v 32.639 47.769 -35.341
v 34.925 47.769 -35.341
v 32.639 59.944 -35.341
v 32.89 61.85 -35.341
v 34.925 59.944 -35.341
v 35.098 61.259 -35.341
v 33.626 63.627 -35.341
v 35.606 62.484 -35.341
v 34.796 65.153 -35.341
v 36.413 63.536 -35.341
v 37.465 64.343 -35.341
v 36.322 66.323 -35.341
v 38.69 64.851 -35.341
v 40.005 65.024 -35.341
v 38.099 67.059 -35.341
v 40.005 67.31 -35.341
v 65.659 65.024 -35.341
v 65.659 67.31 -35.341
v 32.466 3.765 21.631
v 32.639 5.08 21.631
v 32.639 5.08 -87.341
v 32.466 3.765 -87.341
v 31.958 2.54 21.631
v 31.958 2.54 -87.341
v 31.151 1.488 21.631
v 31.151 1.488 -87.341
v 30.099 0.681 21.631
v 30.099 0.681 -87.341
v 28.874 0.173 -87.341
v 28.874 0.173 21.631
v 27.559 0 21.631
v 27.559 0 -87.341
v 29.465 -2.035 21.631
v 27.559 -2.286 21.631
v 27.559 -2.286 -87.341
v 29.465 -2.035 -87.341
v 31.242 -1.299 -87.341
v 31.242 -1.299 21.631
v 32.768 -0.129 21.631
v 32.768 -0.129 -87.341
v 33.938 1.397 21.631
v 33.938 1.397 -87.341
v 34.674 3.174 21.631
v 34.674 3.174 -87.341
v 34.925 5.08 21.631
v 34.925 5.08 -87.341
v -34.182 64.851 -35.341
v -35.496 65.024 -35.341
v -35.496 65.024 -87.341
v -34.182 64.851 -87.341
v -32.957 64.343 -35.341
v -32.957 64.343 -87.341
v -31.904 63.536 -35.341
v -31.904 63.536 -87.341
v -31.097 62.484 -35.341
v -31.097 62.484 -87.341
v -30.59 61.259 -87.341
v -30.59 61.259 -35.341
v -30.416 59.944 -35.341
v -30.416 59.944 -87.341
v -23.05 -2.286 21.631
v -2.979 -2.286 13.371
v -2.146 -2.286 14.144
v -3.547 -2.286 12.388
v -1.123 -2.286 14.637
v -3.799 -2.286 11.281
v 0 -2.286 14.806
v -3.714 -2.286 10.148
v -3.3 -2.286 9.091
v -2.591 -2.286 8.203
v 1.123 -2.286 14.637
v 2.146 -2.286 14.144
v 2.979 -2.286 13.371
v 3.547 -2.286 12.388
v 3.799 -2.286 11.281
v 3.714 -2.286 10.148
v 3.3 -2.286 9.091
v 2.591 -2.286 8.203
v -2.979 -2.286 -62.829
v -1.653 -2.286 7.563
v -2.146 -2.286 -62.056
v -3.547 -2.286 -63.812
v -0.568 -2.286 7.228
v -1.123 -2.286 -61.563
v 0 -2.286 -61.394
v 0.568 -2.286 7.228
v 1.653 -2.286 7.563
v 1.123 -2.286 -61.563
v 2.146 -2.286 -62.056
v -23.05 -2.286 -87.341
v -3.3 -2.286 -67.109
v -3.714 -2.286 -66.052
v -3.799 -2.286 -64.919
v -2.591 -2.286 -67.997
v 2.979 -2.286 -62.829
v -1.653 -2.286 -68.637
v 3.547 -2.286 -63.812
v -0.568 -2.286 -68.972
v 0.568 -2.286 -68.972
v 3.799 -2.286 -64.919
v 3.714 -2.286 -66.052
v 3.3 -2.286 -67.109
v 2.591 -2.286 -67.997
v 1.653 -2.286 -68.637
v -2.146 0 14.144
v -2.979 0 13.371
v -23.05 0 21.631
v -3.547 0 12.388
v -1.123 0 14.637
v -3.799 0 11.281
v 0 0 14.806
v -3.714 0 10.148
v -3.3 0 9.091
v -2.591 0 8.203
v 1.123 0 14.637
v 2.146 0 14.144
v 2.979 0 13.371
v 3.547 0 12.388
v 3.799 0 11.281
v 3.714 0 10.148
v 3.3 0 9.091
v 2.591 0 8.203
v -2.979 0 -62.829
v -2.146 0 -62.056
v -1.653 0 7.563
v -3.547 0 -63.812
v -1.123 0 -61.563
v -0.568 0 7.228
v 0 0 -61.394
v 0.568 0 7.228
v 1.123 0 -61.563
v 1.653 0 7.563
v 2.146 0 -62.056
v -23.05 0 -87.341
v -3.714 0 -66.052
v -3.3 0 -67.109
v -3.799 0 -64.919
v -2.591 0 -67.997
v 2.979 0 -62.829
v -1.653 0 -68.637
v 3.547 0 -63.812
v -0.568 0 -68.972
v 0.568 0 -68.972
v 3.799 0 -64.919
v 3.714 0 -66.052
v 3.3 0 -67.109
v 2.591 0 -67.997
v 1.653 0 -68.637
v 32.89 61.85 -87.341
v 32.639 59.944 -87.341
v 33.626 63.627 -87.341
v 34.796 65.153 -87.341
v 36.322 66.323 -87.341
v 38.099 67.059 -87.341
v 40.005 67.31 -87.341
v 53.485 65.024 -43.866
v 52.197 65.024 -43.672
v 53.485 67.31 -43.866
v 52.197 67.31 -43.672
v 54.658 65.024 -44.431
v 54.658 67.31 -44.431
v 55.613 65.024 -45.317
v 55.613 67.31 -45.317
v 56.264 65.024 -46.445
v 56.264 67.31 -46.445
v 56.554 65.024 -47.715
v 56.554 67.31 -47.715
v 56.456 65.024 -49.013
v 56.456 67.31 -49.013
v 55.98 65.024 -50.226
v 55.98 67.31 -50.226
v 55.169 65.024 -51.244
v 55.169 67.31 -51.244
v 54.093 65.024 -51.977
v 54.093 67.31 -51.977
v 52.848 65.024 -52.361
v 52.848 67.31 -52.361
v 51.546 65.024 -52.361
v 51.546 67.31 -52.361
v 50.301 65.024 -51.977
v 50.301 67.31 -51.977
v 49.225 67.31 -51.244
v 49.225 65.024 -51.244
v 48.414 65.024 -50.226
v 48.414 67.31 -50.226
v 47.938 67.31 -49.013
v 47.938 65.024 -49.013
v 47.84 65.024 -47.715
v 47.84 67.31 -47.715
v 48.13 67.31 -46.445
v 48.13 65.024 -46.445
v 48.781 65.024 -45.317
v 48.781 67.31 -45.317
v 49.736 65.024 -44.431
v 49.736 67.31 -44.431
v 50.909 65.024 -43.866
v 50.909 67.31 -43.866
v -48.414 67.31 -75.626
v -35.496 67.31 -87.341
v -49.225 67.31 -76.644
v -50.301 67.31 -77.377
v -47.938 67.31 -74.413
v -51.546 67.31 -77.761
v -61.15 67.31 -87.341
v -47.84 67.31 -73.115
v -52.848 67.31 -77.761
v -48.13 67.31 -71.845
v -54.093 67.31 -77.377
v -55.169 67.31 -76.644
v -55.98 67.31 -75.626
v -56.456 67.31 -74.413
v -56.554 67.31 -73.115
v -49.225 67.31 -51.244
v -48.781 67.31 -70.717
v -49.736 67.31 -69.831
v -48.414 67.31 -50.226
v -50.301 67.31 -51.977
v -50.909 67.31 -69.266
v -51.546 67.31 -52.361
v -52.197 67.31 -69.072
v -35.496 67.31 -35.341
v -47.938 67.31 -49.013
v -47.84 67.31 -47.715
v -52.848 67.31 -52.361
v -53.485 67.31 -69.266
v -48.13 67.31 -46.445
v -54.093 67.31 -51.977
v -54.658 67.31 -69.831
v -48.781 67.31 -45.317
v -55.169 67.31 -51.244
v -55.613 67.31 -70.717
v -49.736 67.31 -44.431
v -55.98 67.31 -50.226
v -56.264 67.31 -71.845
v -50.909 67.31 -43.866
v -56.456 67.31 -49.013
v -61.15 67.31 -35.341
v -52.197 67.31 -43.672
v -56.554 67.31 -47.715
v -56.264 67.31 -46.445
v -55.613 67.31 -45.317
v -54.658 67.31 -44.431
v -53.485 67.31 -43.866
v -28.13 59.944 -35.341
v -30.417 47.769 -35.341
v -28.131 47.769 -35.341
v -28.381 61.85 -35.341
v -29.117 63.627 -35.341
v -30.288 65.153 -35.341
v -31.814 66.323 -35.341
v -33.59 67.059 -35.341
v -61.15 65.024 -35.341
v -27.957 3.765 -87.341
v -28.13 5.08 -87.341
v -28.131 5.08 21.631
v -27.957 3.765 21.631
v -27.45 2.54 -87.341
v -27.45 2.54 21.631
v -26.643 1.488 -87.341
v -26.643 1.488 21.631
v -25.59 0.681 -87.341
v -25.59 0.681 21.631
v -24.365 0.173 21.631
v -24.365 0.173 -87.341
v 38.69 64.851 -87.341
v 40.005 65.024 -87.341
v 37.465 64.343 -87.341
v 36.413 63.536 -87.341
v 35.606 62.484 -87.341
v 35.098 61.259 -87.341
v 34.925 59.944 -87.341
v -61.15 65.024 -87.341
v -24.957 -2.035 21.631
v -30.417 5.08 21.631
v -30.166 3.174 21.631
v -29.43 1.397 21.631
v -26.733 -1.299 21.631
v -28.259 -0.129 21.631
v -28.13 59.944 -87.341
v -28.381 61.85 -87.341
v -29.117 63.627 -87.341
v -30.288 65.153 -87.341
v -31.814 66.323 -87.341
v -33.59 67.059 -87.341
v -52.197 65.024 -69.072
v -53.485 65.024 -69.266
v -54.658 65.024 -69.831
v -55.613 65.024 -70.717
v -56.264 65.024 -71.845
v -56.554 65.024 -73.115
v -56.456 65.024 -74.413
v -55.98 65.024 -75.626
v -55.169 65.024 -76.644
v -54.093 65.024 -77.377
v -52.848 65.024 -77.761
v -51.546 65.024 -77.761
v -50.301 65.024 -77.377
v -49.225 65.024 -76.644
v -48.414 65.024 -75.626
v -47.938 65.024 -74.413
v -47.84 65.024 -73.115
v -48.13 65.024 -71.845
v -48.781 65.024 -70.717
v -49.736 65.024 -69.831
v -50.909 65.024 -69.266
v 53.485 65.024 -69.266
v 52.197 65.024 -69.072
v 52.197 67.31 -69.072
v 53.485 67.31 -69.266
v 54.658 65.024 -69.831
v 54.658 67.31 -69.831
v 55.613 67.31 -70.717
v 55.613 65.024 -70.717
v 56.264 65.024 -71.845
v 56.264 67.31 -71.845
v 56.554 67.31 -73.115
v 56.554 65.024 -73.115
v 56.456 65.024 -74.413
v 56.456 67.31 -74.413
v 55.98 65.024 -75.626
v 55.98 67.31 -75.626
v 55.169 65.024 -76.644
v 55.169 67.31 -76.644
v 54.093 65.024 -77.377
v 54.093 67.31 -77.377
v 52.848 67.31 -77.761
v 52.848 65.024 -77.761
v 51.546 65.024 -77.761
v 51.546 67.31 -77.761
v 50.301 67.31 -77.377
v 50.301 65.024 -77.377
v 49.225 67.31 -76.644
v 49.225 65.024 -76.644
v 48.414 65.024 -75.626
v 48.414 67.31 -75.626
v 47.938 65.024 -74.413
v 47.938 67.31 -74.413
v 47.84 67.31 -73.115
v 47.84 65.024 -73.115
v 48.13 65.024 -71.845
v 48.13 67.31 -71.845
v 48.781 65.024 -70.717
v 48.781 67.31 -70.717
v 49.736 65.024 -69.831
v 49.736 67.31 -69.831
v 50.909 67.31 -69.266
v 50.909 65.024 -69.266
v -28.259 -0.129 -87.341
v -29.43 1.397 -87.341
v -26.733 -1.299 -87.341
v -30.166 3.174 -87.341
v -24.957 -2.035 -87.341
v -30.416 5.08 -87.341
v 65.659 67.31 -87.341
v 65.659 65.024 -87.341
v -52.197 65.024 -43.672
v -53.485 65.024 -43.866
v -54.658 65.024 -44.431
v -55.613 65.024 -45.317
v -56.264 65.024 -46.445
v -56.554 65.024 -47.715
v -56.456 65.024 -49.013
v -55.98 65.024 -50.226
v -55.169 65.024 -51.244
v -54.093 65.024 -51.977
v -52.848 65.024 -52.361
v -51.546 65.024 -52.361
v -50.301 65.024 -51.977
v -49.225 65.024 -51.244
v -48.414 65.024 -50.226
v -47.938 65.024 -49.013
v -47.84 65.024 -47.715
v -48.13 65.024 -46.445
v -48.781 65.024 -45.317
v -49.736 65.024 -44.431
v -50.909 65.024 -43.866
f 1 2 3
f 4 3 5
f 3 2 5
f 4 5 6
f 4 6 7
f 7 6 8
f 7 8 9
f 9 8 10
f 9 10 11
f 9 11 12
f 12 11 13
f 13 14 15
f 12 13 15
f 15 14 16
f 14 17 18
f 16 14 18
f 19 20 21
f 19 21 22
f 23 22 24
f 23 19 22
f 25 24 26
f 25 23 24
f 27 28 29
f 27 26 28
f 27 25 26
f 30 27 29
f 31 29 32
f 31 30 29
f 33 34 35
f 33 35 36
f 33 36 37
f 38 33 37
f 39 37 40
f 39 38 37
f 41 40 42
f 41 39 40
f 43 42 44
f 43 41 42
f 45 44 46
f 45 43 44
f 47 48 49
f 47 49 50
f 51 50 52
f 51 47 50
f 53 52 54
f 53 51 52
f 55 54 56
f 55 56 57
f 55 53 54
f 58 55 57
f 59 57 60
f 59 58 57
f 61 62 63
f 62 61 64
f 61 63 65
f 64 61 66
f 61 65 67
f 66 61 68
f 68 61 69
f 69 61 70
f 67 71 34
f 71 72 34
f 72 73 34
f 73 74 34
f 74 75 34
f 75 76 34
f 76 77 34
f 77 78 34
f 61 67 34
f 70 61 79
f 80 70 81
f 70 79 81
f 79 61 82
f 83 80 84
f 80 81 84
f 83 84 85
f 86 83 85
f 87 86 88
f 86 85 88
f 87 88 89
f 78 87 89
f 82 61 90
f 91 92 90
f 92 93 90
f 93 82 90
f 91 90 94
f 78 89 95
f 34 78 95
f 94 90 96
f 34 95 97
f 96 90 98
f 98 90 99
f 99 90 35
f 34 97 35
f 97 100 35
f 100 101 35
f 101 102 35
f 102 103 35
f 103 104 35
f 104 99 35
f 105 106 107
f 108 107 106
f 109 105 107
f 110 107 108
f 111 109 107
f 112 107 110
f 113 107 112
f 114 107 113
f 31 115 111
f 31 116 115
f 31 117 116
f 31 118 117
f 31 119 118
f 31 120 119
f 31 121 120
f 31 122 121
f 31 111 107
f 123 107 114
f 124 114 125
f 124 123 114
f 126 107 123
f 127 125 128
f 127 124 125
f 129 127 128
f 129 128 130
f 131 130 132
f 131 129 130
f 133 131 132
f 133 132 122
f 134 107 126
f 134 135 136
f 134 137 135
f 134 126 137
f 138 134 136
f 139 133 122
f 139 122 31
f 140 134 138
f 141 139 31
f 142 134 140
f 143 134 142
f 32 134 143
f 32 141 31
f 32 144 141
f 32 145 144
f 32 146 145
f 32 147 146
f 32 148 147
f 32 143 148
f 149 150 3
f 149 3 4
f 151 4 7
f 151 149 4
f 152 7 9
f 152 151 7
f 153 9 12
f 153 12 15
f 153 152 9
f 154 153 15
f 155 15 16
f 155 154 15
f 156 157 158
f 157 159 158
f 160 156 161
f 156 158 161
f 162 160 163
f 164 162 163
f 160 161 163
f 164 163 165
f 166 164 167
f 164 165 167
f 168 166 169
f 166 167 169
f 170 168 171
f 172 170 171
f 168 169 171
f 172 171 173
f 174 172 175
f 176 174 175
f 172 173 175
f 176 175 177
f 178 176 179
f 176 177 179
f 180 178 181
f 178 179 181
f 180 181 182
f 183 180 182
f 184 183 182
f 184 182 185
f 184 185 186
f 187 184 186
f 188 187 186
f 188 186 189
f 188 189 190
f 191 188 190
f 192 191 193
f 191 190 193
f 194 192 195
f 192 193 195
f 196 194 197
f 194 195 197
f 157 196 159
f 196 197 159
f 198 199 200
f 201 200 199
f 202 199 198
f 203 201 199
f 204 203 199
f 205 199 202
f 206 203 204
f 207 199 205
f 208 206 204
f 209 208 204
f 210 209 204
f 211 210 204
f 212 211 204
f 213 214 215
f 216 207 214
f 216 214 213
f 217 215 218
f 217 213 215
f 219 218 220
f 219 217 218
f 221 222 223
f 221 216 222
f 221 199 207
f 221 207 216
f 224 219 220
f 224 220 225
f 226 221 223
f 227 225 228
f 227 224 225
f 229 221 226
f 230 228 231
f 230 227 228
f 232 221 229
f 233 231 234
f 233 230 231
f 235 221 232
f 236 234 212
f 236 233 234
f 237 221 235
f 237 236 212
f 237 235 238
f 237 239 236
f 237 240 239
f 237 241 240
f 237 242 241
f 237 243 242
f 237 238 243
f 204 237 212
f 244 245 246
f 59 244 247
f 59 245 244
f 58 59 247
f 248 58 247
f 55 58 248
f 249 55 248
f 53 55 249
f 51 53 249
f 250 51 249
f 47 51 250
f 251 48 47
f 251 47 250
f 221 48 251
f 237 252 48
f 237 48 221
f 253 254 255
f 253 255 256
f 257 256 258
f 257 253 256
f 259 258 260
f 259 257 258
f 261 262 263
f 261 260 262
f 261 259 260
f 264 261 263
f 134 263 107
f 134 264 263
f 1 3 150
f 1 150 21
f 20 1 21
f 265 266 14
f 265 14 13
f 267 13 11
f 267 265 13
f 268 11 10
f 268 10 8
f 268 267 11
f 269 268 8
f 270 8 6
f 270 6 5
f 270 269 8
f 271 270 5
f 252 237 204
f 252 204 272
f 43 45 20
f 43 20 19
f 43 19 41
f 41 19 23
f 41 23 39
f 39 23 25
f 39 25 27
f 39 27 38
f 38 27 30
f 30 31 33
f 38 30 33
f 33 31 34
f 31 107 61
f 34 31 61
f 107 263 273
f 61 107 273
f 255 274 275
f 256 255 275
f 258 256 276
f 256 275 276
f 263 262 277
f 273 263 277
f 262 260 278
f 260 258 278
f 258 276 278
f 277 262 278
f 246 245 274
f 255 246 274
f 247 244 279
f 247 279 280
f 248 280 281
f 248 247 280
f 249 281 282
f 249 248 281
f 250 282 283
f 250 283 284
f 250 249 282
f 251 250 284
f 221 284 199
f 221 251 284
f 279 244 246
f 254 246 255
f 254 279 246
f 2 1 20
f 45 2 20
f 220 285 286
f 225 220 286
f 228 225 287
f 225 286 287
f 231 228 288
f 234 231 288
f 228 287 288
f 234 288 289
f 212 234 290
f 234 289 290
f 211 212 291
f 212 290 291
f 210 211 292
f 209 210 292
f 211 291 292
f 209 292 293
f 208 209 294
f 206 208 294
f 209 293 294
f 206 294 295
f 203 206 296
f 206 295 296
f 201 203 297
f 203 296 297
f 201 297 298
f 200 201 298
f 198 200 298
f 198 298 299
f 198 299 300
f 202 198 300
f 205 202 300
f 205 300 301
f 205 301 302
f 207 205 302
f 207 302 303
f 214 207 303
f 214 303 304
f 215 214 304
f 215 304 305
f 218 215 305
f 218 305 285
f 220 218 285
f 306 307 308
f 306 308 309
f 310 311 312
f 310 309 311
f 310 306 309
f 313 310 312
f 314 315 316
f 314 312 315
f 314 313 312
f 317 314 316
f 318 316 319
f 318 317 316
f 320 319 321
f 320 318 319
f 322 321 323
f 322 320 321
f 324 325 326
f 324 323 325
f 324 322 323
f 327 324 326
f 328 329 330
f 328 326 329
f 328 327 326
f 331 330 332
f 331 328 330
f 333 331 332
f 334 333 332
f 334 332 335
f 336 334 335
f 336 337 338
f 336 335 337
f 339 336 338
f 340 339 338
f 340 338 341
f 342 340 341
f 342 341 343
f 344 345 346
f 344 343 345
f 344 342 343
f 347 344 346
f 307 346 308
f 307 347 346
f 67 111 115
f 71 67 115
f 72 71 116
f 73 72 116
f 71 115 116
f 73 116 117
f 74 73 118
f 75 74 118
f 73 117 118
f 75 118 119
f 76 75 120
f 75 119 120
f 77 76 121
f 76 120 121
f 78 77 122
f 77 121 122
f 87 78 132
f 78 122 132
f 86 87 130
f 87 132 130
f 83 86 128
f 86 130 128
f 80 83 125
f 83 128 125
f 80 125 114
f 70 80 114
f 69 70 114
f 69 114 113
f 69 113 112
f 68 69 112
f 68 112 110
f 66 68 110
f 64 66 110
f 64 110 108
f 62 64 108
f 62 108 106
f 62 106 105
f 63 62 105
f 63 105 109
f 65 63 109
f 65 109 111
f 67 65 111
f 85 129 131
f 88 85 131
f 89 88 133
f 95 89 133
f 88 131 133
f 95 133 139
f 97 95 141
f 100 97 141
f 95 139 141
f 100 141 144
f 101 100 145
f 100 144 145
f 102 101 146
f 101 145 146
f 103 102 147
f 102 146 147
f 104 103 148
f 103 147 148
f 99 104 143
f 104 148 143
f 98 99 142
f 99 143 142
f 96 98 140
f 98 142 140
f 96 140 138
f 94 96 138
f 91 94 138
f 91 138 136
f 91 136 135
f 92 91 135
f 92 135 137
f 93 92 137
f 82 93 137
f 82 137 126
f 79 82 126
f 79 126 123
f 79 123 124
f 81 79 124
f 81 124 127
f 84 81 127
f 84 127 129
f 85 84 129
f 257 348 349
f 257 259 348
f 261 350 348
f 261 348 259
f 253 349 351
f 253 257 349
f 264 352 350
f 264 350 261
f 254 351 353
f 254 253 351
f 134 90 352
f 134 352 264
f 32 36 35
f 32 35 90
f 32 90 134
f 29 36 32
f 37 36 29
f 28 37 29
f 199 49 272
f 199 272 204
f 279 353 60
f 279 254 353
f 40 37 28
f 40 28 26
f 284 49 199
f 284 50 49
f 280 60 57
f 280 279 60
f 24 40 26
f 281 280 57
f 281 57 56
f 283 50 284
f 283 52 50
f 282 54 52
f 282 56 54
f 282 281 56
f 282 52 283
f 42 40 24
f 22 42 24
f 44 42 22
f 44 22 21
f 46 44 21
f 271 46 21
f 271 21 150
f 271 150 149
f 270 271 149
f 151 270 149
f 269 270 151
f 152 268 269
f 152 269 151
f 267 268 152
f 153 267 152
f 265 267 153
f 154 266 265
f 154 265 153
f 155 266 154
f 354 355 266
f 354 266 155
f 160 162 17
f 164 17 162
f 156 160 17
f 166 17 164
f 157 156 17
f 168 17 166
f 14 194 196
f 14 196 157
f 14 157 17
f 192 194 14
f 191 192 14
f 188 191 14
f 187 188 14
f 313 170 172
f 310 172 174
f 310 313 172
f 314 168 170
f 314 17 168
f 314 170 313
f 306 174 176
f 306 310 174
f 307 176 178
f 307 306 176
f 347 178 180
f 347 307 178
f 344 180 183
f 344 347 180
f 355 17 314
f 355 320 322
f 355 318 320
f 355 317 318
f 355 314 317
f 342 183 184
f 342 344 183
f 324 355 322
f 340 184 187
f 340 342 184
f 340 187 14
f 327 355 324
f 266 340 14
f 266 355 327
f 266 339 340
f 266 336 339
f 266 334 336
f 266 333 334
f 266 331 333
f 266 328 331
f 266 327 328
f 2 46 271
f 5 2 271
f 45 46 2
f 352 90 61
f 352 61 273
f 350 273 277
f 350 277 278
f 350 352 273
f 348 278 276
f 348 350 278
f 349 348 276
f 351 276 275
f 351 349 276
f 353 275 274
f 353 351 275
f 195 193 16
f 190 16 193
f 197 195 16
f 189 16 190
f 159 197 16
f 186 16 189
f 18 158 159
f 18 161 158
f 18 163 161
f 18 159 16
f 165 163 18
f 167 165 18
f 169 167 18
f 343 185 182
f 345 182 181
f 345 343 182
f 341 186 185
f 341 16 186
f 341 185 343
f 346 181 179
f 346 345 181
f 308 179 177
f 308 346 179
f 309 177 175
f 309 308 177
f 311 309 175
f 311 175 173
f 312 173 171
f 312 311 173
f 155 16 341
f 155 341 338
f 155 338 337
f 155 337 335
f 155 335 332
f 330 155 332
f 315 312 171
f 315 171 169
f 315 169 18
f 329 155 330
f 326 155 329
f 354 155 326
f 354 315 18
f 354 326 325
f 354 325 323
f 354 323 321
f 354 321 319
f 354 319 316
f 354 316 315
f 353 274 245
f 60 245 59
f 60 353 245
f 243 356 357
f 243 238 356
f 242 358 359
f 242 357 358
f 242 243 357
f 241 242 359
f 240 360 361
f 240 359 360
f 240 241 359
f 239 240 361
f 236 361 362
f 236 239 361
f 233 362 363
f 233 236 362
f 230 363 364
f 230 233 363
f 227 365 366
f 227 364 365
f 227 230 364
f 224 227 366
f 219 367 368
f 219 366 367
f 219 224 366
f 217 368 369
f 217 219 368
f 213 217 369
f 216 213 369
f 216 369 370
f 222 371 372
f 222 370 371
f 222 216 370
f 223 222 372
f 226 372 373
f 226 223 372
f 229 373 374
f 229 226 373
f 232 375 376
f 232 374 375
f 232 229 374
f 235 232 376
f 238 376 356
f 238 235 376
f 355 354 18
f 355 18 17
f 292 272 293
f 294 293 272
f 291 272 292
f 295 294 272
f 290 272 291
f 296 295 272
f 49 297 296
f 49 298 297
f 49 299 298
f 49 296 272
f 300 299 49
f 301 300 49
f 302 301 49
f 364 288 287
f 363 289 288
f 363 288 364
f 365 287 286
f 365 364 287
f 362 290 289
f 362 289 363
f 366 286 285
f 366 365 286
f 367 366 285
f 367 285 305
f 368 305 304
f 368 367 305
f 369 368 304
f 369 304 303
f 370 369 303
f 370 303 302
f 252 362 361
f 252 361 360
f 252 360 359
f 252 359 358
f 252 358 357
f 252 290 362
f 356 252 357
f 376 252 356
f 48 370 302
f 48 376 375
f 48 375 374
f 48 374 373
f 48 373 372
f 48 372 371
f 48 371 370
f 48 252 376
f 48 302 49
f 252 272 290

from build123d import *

# Parameters (mm, degrees)
SKETCH2_W                      = 65.3415
SKETCH2_H                      = 177.8
BASE_FLANGE1_DEPTH             = 2.286
EDGE_FLANGE1_STRIP_W           = 19.304
EDGE_FLANGE1_STRIP_H           = 2.286
EDGE_FLANGE1_STRIP_CUT_DEPTH   = 177.8
EDGE_FLANGE1_STRIP_2_W         = 19.304
EDGE_FLANGE1_STRIP_2_H         = 2.286
EDGE_FLANGE1_STRIP_CUT_2_DEPTH = 177.8
EDGE_FLANGE1_DEPTH             = 177.8
EDGE_FLANGE1_BEND_DEPTH        = 177.8
CUT_EXTRUDE1_DEPTH             = 171.223828311
CUT_EXTRUDE1_DEPTH_BACK        = 171.223828311
CUT_EXTRUDE2_DEPTH             = 171.223828311
CUT_EXTRUDE2_DEPTH_BACK        = 171.223828311
SKETCH20_W                     = 141.560534952
SKETCH20_H                     = 182.926434851
EDGE_FLANGE3_STRIP_W           = 19.304
EDGE_FLANGE3_STRIP_H           = 2.286
EDGE_FLANGE3_STRIP_CUT_DEPTH   = 52
EDGE_FLANGE3_STRIP_2_W         = 19.304
EDGE_FLANGE3_STRIP_2_H         = 2.286
EDGE_FLANGE3_STRIP_CUT_2_DEPTH = 52
EDGE_FLANGE3_DEPTH             = 52
EDGE_FLANGE3_BEND_DEPTH        = 52
SKETCH30_R                     = 3.81
CUT_EXTRUDE3_DEPTH             = 129.336350021
SKETCH31_R                     = 4.3688
CUT_EXTRUDE4_DEPTH             = 129.336350021


# Sheet-metal steps are written as plain solids
with BuildPart() as part:
    # Sketch2 → Base-Flange1 (new body)
    with BuildSketch(Plane(origin=(0, 0, 0), x_dir=(1, 0, 0), z_dir=(0, 1, 0))):
        with Locations((2.25425, 63.5)):
            Rectangle(SKETCH2_W, SKETCH2_H)
    extrude(amount=-BASE_FLANGE1_DEPTH)

    # Edge-Flange1 strip (across the edge) → Edge-Flange1 strip cut (cut)
    with BuildSketch(Plane(origin=(-30.4165, 0, -152.4), x_dir=(1, 0, 0), z_dir=(0, 0, 1))):
        with Locations((-2.286, -1.143)):
            Rectangle(EDGE_FLANGE1_STRIP_W, EDGE_FLANGE1_STRIP_H)
    extrude(amount=EDGE_FLANGE1_STRIP_CUT_DEPTH, mode=Mode.SUBTRACT)

    # Edge-Flange1 strip 2 (across the edge) → Edge-Flange1 strip cut 2 (cut)
    with BuildSketch(Plane(origin=(34.925, 0, 25.4), x_dir=(-1, 0, 0), z_dir=(0, 0, -1))):
        with Locations((-2.286, -1.143)):
            Rectangle(EDGE_FLANGE1_STRIP_2_W, EDGE_FLANGE1_STRIP_2_H)
    extrude(amount=EDGE_FLANGE1_STRIP_CUT_2_DEPTH, mode=Mode.SUBTRACT)

    # Edge-Flange1 section (across the edge) → Edge-Flange1 (add)
    with BuildSketch(Plane(origin=(-30.4165, 0, -152.4), x_dir=(1, 0, 0), z_dir=(0, 0, 1))):
        with BuildLine():
            Line((0, 5.08), (0, 67.31))
            Line((0, 67.31), (2.286, 67.31))
            Line((2.286, 67.31), (2.286, 5.08))
            ThreePointArc((2.286, 5.08), (3.773897552, 1.487897552), (7.366, 0))
            Line((7.366, 0), (7.366, -2.286))
            ThreePointArc((7.366, -2.286), (2.15745145, -0.12854855), (0, 5.08))
        make_face()
    extrude(amount=EDGE_FLANGE1_DEPTH)

    # Edge-Flange1 section 2 (across the edge) → Edge-Flange1 bend (add)
    with BuildSketch(Plane(origin=(34.925, 0, 25.4), x_dir=(-1, 0, 0), z_dir=(0, 0, -1))):
        with BuildLine():
            Line((0, 5.08), (0, 67.31))
            Line((0, 67.31), (2.286, 67.31))
            Line((2.286, 67.31), (2.286, 5.08))
            ThreePointArc((2.286, 5.08), (3.773897552, 1.487897552), (7.366, 0))
            Line((7.366, 0), (7.366, -2.286))
            ThreePointArc((7.366, -2.286), (2.15745145, -0.12854855), (0, 5.08))
        make_face()
    extrude(amount=EDGE_FLANGE1_BEND_DEPTH)

    # Sketch19 → Cut-Extrude1 (cut, two sides: drawn at the far end of the back side and taken through both)
    with BuildSketch(Plane(origin=(0, 0, 0), x_dir=(0, 0, -1), z_dir=(1, 0, 0)).offset(-CUT_EXTRUDE1_DEPTH_BACK)):
        Polygon((-21.631039281, 5.08), (-21.631039281, -27.285513127), (-49.571039281, -27.285513127), (-49.571039281, 149.369143464), (35.341160719, 149.369143464), (35.341160719, 47.769143464), align=None)
    extrude(amount=CUT_EXTRUDE1_DEPTH + CUT_EXTRUDE1_DEPTH_BACK, mode=Mode.SUBTRACT)

    # Sketch20 → Cut-Extrude2 (cut, two sides: drawn at the far end of the back side and taken through both)
    with BuildSketch(Plane(origin=(0, 0, 0), x_dir=(0, 0, -1), z_dir=(1, 0, 0)).offset(-CUT_EXTRUDE2_DEPTH_BACK)):
        with Locations((158.121428195, 37.56832172)):
            Rectangle(SKETCH20_W, SKETCH20_H)
    extrude(amount=CUT_EXTRUDE2_DEPTH + CUT_EXTRUDE2_DEPTH_BACK, mode=Mode.SUBTRACT)

    # Edge-Flange3 strip (across the edge) → Edge-Flange3 strip cut (cut)
    with BuildSketch(Plane(origin=(-30.4165, 67.31, -35.341160719), x_dir=(0, -1, 0), z_dir=(0, 0, -1))):
        with Locations((-2.286, -1.143)):
            Rectangle(EDGE_FLANGE3_STRIP_W, EDGE_FLANGE3_STRIP_H)
    extrude(amount=EDGE_FLANGE3_STRIP_CUT_DEPTH, mode=Mode.SUBTRACT)

    # Edge-Flange3 strip 2 (across the edge) → Edge-Flange3 strip cut 2 (cut)
    with BuildSketch(Plane(origin=(34.925, 67.31, -87.341160719), x_dir=(0, -1, 0), z_dir=(0, 0, 1))):
        with Locations((-2.286, -1.143)):
            Rectangle(EDGE_FLANGE3_STRIP_2_W, EDGE_FLANGE3_STRIP_2_H)
    extrude(amount=EDGE_FLANGE3_STRIP_CUT_2_DEPTH, mode=Mode.SUBTRACT)

    # Edge-Flange3 section (across the edge) → Edge-Flange3 (add)
    with BuildSketch(Plane(origin=(-30.4165, 67.31, -35.341160719), x_dir=(0, -1, 0), z_dir=(0, 0, -1))):
        with BuildLine():
            Line((0, 5.08), (0, 30.734))
            Line((0, 30.734), (2.286, 30.734))
            Line((2.286, 30.734), (2.286, 5.08))
            ThreePointArc((2.286, 5.08), (3.773897552, 1.487897552), (7.366, 0))
            Line((7.366, 0), (7.366, -2.286))
            ThreePointArc((7.366, -2.286), (2.15745145, -0.12854855), (0, 5.08))
        make_face()
    extrude(amount=EDGE_FLANGE3_DEPTH)

    # Edge-Flange3 section 2 (across the edge) → Edge-Flange3 bend (add)
    with BuildSketch(Plane(origin=(34.925, 67.31, -87.341160719), x_dir=(0, -1, 0), z_dir=(0, 0, 1))):
        with BuildLine():
            Line((0, 5.08), (0, 30.734))
            Line((0, 30.734), (2.286, 30.734))
            Line((2.286, 30.734), (2.286, 5.08))
            ThreePointArc((2.286, 5.08), (3.773897552, 1.487897552), (7.366, 0))
            Line((7.366, 0), (7.366, -2.286))
            ThreePointArc((7.366, -2.286), (2.15745145, -0.12854855), (0, 5.08))
        make_face()
    extrude(amount=EDGE_FLANGE3_BEND_DEPTH)

    # Sketch30 → Cut-Extrude3 (cut, through all)
    with BuildSketch(Plane(origin=(0, 0, 0), x_dir=(1, 0, 0), z_dir=(0, 1, 0))):
        with Locations(Location((0, -10.995792601, 0), (0, 0, 270))):
            Circle(SKETCH30_R)
        with Locations(Location((0, 65.204207399, 0), (0, 0, 270))):
            Circle(SKETCH30_R)
    extrude(amount=-CUT_EXTRUDE3_DEPTH, mode=Mode.SUBTRACT)

    # Sketch31 → Cut-Extrude4 (cut, symmetric)
    with BuildSketch(Plane(origin=(0, 0, 0), x_dir=(1, 0, 0), z_dir=(0, 1, 0))):
        with Locations(Location((52.197, 73.441160719, 0), (0, 0, 270))):
            Circle(SKETCH31_R)
        with Locations(Location((52.197, 48.041160719, 0), (0, 0, 270))):
            Circle(SKETCH31_R)
    cut_extrude4 = extrude(amount=CUT_EXTRUDE4_DEPTH, both=True, mode=Mode.SUBTRACT)

    # Mirror1: Cut-Extrude4 across plane
    add(cut_extrude4.mirror(Plane(origin=(0, 0, 0), x_dir=(0, 0, 1), z_dir=(1, 0, 0))), mode=Mode.SUBTRACT)


solid = part.part
